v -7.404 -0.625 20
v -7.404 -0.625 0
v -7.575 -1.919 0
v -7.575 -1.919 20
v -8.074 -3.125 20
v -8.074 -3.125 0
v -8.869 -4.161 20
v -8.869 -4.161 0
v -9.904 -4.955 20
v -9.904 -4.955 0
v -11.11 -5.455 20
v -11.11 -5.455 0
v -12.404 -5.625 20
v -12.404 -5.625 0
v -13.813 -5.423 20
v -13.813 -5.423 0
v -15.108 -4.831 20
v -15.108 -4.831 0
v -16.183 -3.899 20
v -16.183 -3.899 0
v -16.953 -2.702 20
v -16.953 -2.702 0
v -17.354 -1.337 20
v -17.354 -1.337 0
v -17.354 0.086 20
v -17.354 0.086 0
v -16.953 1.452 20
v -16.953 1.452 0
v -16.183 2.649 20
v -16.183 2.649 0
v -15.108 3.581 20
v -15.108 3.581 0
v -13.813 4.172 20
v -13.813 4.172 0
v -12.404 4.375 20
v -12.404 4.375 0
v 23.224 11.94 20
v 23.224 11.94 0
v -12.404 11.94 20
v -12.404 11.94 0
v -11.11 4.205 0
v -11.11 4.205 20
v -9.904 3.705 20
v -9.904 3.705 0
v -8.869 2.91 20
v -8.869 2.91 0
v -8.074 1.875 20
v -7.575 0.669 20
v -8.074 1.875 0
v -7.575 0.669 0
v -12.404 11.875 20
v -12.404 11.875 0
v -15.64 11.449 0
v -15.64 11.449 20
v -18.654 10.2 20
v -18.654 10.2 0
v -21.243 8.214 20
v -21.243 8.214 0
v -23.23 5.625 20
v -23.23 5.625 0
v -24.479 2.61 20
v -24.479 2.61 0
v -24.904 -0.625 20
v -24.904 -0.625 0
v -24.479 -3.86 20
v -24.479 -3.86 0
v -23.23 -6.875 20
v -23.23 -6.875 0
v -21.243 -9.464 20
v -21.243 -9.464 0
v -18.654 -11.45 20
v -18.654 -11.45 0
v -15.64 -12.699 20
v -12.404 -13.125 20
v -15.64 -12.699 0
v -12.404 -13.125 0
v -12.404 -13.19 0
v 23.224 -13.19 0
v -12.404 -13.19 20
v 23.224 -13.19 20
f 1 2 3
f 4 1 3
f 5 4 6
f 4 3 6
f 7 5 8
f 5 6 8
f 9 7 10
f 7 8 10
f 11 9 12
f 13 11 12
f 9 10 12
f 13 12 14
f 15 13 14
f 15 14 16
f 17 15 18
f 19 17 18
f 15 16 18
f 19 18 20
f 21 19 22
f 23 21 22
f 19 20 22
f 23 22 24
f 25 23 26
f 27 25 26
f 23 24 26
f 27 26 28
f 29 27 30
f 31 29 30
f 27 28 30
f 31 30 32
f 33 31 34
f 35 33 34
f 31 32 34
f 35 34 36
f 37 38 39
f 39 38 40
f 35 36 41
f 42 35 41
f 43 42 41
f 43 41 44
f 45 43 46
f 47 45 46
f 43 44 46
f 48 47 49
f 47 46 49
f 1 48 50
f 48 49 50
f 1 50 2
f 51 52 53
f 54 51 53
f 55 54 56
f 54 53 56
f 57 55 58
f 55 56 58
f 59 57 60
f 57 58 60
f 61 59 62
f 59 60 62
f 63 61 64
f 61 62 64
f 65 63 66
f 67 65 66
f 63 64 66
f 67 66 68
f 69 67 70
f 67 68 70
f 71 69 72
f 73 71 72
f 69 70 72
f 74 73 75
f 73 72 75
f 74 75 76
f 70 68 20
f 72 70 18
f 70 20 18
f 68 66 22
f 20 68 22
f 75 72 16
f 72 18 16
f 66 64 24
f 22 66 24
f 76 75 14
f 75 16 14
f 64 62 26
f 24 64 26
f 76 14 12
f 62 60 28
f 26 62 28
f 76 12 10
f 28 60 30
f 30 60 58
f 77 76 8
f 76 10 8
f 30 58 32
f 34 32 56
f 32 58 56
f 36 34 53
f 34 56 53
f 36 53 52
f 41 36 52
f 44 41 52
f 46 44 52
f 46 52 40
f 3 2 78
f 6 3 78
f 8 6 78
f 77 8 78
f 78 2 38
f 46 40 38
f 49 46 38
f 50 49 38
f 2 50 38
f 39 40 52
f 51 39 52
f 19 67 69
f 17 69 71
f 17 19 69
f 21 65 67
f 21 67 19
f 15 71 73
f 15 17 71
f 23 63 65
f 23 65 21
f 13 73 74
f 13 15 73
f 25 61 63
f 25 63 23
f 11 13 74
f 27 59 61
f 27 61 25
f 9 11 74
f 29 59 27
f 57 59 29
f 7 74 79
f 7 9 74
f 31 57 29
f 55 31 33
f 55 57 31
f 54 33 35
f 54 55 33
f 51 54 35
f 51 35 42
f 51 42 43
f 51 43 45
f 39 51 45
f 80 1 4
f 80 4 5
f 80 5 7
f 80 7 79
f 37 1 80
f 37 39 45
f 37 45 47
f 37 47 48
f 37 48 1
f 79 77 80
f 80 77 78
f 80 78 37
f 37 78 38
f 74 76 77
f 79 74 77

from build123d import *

# Parameters (mm, degrees)
F1_DEPTH = 20


with BuildPart() as f1:
    # F0 (on Top) → F1 (new body)
    with BuildSketch(Plane.XY):
        with BuildLine():
            Line((-12.4044854931, 4.3749214336), (-12.4044854931, 11.8749214336))
            ThreePointArc((-12.4044854931, 11.8749214336), (-24.9044854931, -0.6250785664), (-12.4044854931, -13.1250785664))
            Line((-12.4044854931, -13.1250785664), (-12.4044854931, -5.6250785664))
            ThreePointArc((-12.4044854931, -5.6250785664), (-17.4044854931, -0.6250785664), (-12.4044854931, 4.3749214336))
        make_face()
        with BuildLine():
            ThreePointArc((0.0955145069, -0.6250785664), (-3.5656507283, 8.2137561985), (-12.4044854931, 11.8749214336))
            Line((-12.4044854931, 11.8749214336), (-12.4044854931, 4.3749214336))
            ThreePointArc((-12.4044854931, 4.3749214336), (-8.8689515872, 2.9104553396), (-7.4044854931, -0.6250785664))
            ThreePointArc((-7.4044854931, -0.6250785664), (-8.8689515872, -4.1606124723), (-12.4044854931, -5.6250785664))
            Line((-12.4044854931, -5.6250785664), (-12.4044854931, -13.1250785664))
            ThreePointArc((-12.4044854931, -13.1250785664), (-3.5656507283, -9.4639133312), (0.0955145069, -0.6250785664))
        make_face()
        with BuildLine():
            Line((23.2241750516, 11.9398952645), (-12.4044854931, 11.9398952645))
            Line((-12.4044854931, 11.9398952645), (-12.4044854931, 11.8749214336))
            ThreePointArc((-12.4044854931, 11.8749214336), (-3.5656507283, 8.2137561985), (0.0955145069, -0.6250785664))
            ThreePointArc((0.0955145069, -0.6250785664), (-3.5656507283, -9.4639133312), (-12.4044854931, -13.1250785664))
            Line((-12.4044854931, -13.1250785664), (-12.4044854931, -13.1900523973))
            Line((-12.4044854931, -13.1900523973), (23.2241750516, -13.1900523973))
            Line((23.2241750516, -13.1900523973), (23.2241750516, 11.9398952645))
        make_face()
    extrude(amount=F1_DEPTH)


solid = f1.part
